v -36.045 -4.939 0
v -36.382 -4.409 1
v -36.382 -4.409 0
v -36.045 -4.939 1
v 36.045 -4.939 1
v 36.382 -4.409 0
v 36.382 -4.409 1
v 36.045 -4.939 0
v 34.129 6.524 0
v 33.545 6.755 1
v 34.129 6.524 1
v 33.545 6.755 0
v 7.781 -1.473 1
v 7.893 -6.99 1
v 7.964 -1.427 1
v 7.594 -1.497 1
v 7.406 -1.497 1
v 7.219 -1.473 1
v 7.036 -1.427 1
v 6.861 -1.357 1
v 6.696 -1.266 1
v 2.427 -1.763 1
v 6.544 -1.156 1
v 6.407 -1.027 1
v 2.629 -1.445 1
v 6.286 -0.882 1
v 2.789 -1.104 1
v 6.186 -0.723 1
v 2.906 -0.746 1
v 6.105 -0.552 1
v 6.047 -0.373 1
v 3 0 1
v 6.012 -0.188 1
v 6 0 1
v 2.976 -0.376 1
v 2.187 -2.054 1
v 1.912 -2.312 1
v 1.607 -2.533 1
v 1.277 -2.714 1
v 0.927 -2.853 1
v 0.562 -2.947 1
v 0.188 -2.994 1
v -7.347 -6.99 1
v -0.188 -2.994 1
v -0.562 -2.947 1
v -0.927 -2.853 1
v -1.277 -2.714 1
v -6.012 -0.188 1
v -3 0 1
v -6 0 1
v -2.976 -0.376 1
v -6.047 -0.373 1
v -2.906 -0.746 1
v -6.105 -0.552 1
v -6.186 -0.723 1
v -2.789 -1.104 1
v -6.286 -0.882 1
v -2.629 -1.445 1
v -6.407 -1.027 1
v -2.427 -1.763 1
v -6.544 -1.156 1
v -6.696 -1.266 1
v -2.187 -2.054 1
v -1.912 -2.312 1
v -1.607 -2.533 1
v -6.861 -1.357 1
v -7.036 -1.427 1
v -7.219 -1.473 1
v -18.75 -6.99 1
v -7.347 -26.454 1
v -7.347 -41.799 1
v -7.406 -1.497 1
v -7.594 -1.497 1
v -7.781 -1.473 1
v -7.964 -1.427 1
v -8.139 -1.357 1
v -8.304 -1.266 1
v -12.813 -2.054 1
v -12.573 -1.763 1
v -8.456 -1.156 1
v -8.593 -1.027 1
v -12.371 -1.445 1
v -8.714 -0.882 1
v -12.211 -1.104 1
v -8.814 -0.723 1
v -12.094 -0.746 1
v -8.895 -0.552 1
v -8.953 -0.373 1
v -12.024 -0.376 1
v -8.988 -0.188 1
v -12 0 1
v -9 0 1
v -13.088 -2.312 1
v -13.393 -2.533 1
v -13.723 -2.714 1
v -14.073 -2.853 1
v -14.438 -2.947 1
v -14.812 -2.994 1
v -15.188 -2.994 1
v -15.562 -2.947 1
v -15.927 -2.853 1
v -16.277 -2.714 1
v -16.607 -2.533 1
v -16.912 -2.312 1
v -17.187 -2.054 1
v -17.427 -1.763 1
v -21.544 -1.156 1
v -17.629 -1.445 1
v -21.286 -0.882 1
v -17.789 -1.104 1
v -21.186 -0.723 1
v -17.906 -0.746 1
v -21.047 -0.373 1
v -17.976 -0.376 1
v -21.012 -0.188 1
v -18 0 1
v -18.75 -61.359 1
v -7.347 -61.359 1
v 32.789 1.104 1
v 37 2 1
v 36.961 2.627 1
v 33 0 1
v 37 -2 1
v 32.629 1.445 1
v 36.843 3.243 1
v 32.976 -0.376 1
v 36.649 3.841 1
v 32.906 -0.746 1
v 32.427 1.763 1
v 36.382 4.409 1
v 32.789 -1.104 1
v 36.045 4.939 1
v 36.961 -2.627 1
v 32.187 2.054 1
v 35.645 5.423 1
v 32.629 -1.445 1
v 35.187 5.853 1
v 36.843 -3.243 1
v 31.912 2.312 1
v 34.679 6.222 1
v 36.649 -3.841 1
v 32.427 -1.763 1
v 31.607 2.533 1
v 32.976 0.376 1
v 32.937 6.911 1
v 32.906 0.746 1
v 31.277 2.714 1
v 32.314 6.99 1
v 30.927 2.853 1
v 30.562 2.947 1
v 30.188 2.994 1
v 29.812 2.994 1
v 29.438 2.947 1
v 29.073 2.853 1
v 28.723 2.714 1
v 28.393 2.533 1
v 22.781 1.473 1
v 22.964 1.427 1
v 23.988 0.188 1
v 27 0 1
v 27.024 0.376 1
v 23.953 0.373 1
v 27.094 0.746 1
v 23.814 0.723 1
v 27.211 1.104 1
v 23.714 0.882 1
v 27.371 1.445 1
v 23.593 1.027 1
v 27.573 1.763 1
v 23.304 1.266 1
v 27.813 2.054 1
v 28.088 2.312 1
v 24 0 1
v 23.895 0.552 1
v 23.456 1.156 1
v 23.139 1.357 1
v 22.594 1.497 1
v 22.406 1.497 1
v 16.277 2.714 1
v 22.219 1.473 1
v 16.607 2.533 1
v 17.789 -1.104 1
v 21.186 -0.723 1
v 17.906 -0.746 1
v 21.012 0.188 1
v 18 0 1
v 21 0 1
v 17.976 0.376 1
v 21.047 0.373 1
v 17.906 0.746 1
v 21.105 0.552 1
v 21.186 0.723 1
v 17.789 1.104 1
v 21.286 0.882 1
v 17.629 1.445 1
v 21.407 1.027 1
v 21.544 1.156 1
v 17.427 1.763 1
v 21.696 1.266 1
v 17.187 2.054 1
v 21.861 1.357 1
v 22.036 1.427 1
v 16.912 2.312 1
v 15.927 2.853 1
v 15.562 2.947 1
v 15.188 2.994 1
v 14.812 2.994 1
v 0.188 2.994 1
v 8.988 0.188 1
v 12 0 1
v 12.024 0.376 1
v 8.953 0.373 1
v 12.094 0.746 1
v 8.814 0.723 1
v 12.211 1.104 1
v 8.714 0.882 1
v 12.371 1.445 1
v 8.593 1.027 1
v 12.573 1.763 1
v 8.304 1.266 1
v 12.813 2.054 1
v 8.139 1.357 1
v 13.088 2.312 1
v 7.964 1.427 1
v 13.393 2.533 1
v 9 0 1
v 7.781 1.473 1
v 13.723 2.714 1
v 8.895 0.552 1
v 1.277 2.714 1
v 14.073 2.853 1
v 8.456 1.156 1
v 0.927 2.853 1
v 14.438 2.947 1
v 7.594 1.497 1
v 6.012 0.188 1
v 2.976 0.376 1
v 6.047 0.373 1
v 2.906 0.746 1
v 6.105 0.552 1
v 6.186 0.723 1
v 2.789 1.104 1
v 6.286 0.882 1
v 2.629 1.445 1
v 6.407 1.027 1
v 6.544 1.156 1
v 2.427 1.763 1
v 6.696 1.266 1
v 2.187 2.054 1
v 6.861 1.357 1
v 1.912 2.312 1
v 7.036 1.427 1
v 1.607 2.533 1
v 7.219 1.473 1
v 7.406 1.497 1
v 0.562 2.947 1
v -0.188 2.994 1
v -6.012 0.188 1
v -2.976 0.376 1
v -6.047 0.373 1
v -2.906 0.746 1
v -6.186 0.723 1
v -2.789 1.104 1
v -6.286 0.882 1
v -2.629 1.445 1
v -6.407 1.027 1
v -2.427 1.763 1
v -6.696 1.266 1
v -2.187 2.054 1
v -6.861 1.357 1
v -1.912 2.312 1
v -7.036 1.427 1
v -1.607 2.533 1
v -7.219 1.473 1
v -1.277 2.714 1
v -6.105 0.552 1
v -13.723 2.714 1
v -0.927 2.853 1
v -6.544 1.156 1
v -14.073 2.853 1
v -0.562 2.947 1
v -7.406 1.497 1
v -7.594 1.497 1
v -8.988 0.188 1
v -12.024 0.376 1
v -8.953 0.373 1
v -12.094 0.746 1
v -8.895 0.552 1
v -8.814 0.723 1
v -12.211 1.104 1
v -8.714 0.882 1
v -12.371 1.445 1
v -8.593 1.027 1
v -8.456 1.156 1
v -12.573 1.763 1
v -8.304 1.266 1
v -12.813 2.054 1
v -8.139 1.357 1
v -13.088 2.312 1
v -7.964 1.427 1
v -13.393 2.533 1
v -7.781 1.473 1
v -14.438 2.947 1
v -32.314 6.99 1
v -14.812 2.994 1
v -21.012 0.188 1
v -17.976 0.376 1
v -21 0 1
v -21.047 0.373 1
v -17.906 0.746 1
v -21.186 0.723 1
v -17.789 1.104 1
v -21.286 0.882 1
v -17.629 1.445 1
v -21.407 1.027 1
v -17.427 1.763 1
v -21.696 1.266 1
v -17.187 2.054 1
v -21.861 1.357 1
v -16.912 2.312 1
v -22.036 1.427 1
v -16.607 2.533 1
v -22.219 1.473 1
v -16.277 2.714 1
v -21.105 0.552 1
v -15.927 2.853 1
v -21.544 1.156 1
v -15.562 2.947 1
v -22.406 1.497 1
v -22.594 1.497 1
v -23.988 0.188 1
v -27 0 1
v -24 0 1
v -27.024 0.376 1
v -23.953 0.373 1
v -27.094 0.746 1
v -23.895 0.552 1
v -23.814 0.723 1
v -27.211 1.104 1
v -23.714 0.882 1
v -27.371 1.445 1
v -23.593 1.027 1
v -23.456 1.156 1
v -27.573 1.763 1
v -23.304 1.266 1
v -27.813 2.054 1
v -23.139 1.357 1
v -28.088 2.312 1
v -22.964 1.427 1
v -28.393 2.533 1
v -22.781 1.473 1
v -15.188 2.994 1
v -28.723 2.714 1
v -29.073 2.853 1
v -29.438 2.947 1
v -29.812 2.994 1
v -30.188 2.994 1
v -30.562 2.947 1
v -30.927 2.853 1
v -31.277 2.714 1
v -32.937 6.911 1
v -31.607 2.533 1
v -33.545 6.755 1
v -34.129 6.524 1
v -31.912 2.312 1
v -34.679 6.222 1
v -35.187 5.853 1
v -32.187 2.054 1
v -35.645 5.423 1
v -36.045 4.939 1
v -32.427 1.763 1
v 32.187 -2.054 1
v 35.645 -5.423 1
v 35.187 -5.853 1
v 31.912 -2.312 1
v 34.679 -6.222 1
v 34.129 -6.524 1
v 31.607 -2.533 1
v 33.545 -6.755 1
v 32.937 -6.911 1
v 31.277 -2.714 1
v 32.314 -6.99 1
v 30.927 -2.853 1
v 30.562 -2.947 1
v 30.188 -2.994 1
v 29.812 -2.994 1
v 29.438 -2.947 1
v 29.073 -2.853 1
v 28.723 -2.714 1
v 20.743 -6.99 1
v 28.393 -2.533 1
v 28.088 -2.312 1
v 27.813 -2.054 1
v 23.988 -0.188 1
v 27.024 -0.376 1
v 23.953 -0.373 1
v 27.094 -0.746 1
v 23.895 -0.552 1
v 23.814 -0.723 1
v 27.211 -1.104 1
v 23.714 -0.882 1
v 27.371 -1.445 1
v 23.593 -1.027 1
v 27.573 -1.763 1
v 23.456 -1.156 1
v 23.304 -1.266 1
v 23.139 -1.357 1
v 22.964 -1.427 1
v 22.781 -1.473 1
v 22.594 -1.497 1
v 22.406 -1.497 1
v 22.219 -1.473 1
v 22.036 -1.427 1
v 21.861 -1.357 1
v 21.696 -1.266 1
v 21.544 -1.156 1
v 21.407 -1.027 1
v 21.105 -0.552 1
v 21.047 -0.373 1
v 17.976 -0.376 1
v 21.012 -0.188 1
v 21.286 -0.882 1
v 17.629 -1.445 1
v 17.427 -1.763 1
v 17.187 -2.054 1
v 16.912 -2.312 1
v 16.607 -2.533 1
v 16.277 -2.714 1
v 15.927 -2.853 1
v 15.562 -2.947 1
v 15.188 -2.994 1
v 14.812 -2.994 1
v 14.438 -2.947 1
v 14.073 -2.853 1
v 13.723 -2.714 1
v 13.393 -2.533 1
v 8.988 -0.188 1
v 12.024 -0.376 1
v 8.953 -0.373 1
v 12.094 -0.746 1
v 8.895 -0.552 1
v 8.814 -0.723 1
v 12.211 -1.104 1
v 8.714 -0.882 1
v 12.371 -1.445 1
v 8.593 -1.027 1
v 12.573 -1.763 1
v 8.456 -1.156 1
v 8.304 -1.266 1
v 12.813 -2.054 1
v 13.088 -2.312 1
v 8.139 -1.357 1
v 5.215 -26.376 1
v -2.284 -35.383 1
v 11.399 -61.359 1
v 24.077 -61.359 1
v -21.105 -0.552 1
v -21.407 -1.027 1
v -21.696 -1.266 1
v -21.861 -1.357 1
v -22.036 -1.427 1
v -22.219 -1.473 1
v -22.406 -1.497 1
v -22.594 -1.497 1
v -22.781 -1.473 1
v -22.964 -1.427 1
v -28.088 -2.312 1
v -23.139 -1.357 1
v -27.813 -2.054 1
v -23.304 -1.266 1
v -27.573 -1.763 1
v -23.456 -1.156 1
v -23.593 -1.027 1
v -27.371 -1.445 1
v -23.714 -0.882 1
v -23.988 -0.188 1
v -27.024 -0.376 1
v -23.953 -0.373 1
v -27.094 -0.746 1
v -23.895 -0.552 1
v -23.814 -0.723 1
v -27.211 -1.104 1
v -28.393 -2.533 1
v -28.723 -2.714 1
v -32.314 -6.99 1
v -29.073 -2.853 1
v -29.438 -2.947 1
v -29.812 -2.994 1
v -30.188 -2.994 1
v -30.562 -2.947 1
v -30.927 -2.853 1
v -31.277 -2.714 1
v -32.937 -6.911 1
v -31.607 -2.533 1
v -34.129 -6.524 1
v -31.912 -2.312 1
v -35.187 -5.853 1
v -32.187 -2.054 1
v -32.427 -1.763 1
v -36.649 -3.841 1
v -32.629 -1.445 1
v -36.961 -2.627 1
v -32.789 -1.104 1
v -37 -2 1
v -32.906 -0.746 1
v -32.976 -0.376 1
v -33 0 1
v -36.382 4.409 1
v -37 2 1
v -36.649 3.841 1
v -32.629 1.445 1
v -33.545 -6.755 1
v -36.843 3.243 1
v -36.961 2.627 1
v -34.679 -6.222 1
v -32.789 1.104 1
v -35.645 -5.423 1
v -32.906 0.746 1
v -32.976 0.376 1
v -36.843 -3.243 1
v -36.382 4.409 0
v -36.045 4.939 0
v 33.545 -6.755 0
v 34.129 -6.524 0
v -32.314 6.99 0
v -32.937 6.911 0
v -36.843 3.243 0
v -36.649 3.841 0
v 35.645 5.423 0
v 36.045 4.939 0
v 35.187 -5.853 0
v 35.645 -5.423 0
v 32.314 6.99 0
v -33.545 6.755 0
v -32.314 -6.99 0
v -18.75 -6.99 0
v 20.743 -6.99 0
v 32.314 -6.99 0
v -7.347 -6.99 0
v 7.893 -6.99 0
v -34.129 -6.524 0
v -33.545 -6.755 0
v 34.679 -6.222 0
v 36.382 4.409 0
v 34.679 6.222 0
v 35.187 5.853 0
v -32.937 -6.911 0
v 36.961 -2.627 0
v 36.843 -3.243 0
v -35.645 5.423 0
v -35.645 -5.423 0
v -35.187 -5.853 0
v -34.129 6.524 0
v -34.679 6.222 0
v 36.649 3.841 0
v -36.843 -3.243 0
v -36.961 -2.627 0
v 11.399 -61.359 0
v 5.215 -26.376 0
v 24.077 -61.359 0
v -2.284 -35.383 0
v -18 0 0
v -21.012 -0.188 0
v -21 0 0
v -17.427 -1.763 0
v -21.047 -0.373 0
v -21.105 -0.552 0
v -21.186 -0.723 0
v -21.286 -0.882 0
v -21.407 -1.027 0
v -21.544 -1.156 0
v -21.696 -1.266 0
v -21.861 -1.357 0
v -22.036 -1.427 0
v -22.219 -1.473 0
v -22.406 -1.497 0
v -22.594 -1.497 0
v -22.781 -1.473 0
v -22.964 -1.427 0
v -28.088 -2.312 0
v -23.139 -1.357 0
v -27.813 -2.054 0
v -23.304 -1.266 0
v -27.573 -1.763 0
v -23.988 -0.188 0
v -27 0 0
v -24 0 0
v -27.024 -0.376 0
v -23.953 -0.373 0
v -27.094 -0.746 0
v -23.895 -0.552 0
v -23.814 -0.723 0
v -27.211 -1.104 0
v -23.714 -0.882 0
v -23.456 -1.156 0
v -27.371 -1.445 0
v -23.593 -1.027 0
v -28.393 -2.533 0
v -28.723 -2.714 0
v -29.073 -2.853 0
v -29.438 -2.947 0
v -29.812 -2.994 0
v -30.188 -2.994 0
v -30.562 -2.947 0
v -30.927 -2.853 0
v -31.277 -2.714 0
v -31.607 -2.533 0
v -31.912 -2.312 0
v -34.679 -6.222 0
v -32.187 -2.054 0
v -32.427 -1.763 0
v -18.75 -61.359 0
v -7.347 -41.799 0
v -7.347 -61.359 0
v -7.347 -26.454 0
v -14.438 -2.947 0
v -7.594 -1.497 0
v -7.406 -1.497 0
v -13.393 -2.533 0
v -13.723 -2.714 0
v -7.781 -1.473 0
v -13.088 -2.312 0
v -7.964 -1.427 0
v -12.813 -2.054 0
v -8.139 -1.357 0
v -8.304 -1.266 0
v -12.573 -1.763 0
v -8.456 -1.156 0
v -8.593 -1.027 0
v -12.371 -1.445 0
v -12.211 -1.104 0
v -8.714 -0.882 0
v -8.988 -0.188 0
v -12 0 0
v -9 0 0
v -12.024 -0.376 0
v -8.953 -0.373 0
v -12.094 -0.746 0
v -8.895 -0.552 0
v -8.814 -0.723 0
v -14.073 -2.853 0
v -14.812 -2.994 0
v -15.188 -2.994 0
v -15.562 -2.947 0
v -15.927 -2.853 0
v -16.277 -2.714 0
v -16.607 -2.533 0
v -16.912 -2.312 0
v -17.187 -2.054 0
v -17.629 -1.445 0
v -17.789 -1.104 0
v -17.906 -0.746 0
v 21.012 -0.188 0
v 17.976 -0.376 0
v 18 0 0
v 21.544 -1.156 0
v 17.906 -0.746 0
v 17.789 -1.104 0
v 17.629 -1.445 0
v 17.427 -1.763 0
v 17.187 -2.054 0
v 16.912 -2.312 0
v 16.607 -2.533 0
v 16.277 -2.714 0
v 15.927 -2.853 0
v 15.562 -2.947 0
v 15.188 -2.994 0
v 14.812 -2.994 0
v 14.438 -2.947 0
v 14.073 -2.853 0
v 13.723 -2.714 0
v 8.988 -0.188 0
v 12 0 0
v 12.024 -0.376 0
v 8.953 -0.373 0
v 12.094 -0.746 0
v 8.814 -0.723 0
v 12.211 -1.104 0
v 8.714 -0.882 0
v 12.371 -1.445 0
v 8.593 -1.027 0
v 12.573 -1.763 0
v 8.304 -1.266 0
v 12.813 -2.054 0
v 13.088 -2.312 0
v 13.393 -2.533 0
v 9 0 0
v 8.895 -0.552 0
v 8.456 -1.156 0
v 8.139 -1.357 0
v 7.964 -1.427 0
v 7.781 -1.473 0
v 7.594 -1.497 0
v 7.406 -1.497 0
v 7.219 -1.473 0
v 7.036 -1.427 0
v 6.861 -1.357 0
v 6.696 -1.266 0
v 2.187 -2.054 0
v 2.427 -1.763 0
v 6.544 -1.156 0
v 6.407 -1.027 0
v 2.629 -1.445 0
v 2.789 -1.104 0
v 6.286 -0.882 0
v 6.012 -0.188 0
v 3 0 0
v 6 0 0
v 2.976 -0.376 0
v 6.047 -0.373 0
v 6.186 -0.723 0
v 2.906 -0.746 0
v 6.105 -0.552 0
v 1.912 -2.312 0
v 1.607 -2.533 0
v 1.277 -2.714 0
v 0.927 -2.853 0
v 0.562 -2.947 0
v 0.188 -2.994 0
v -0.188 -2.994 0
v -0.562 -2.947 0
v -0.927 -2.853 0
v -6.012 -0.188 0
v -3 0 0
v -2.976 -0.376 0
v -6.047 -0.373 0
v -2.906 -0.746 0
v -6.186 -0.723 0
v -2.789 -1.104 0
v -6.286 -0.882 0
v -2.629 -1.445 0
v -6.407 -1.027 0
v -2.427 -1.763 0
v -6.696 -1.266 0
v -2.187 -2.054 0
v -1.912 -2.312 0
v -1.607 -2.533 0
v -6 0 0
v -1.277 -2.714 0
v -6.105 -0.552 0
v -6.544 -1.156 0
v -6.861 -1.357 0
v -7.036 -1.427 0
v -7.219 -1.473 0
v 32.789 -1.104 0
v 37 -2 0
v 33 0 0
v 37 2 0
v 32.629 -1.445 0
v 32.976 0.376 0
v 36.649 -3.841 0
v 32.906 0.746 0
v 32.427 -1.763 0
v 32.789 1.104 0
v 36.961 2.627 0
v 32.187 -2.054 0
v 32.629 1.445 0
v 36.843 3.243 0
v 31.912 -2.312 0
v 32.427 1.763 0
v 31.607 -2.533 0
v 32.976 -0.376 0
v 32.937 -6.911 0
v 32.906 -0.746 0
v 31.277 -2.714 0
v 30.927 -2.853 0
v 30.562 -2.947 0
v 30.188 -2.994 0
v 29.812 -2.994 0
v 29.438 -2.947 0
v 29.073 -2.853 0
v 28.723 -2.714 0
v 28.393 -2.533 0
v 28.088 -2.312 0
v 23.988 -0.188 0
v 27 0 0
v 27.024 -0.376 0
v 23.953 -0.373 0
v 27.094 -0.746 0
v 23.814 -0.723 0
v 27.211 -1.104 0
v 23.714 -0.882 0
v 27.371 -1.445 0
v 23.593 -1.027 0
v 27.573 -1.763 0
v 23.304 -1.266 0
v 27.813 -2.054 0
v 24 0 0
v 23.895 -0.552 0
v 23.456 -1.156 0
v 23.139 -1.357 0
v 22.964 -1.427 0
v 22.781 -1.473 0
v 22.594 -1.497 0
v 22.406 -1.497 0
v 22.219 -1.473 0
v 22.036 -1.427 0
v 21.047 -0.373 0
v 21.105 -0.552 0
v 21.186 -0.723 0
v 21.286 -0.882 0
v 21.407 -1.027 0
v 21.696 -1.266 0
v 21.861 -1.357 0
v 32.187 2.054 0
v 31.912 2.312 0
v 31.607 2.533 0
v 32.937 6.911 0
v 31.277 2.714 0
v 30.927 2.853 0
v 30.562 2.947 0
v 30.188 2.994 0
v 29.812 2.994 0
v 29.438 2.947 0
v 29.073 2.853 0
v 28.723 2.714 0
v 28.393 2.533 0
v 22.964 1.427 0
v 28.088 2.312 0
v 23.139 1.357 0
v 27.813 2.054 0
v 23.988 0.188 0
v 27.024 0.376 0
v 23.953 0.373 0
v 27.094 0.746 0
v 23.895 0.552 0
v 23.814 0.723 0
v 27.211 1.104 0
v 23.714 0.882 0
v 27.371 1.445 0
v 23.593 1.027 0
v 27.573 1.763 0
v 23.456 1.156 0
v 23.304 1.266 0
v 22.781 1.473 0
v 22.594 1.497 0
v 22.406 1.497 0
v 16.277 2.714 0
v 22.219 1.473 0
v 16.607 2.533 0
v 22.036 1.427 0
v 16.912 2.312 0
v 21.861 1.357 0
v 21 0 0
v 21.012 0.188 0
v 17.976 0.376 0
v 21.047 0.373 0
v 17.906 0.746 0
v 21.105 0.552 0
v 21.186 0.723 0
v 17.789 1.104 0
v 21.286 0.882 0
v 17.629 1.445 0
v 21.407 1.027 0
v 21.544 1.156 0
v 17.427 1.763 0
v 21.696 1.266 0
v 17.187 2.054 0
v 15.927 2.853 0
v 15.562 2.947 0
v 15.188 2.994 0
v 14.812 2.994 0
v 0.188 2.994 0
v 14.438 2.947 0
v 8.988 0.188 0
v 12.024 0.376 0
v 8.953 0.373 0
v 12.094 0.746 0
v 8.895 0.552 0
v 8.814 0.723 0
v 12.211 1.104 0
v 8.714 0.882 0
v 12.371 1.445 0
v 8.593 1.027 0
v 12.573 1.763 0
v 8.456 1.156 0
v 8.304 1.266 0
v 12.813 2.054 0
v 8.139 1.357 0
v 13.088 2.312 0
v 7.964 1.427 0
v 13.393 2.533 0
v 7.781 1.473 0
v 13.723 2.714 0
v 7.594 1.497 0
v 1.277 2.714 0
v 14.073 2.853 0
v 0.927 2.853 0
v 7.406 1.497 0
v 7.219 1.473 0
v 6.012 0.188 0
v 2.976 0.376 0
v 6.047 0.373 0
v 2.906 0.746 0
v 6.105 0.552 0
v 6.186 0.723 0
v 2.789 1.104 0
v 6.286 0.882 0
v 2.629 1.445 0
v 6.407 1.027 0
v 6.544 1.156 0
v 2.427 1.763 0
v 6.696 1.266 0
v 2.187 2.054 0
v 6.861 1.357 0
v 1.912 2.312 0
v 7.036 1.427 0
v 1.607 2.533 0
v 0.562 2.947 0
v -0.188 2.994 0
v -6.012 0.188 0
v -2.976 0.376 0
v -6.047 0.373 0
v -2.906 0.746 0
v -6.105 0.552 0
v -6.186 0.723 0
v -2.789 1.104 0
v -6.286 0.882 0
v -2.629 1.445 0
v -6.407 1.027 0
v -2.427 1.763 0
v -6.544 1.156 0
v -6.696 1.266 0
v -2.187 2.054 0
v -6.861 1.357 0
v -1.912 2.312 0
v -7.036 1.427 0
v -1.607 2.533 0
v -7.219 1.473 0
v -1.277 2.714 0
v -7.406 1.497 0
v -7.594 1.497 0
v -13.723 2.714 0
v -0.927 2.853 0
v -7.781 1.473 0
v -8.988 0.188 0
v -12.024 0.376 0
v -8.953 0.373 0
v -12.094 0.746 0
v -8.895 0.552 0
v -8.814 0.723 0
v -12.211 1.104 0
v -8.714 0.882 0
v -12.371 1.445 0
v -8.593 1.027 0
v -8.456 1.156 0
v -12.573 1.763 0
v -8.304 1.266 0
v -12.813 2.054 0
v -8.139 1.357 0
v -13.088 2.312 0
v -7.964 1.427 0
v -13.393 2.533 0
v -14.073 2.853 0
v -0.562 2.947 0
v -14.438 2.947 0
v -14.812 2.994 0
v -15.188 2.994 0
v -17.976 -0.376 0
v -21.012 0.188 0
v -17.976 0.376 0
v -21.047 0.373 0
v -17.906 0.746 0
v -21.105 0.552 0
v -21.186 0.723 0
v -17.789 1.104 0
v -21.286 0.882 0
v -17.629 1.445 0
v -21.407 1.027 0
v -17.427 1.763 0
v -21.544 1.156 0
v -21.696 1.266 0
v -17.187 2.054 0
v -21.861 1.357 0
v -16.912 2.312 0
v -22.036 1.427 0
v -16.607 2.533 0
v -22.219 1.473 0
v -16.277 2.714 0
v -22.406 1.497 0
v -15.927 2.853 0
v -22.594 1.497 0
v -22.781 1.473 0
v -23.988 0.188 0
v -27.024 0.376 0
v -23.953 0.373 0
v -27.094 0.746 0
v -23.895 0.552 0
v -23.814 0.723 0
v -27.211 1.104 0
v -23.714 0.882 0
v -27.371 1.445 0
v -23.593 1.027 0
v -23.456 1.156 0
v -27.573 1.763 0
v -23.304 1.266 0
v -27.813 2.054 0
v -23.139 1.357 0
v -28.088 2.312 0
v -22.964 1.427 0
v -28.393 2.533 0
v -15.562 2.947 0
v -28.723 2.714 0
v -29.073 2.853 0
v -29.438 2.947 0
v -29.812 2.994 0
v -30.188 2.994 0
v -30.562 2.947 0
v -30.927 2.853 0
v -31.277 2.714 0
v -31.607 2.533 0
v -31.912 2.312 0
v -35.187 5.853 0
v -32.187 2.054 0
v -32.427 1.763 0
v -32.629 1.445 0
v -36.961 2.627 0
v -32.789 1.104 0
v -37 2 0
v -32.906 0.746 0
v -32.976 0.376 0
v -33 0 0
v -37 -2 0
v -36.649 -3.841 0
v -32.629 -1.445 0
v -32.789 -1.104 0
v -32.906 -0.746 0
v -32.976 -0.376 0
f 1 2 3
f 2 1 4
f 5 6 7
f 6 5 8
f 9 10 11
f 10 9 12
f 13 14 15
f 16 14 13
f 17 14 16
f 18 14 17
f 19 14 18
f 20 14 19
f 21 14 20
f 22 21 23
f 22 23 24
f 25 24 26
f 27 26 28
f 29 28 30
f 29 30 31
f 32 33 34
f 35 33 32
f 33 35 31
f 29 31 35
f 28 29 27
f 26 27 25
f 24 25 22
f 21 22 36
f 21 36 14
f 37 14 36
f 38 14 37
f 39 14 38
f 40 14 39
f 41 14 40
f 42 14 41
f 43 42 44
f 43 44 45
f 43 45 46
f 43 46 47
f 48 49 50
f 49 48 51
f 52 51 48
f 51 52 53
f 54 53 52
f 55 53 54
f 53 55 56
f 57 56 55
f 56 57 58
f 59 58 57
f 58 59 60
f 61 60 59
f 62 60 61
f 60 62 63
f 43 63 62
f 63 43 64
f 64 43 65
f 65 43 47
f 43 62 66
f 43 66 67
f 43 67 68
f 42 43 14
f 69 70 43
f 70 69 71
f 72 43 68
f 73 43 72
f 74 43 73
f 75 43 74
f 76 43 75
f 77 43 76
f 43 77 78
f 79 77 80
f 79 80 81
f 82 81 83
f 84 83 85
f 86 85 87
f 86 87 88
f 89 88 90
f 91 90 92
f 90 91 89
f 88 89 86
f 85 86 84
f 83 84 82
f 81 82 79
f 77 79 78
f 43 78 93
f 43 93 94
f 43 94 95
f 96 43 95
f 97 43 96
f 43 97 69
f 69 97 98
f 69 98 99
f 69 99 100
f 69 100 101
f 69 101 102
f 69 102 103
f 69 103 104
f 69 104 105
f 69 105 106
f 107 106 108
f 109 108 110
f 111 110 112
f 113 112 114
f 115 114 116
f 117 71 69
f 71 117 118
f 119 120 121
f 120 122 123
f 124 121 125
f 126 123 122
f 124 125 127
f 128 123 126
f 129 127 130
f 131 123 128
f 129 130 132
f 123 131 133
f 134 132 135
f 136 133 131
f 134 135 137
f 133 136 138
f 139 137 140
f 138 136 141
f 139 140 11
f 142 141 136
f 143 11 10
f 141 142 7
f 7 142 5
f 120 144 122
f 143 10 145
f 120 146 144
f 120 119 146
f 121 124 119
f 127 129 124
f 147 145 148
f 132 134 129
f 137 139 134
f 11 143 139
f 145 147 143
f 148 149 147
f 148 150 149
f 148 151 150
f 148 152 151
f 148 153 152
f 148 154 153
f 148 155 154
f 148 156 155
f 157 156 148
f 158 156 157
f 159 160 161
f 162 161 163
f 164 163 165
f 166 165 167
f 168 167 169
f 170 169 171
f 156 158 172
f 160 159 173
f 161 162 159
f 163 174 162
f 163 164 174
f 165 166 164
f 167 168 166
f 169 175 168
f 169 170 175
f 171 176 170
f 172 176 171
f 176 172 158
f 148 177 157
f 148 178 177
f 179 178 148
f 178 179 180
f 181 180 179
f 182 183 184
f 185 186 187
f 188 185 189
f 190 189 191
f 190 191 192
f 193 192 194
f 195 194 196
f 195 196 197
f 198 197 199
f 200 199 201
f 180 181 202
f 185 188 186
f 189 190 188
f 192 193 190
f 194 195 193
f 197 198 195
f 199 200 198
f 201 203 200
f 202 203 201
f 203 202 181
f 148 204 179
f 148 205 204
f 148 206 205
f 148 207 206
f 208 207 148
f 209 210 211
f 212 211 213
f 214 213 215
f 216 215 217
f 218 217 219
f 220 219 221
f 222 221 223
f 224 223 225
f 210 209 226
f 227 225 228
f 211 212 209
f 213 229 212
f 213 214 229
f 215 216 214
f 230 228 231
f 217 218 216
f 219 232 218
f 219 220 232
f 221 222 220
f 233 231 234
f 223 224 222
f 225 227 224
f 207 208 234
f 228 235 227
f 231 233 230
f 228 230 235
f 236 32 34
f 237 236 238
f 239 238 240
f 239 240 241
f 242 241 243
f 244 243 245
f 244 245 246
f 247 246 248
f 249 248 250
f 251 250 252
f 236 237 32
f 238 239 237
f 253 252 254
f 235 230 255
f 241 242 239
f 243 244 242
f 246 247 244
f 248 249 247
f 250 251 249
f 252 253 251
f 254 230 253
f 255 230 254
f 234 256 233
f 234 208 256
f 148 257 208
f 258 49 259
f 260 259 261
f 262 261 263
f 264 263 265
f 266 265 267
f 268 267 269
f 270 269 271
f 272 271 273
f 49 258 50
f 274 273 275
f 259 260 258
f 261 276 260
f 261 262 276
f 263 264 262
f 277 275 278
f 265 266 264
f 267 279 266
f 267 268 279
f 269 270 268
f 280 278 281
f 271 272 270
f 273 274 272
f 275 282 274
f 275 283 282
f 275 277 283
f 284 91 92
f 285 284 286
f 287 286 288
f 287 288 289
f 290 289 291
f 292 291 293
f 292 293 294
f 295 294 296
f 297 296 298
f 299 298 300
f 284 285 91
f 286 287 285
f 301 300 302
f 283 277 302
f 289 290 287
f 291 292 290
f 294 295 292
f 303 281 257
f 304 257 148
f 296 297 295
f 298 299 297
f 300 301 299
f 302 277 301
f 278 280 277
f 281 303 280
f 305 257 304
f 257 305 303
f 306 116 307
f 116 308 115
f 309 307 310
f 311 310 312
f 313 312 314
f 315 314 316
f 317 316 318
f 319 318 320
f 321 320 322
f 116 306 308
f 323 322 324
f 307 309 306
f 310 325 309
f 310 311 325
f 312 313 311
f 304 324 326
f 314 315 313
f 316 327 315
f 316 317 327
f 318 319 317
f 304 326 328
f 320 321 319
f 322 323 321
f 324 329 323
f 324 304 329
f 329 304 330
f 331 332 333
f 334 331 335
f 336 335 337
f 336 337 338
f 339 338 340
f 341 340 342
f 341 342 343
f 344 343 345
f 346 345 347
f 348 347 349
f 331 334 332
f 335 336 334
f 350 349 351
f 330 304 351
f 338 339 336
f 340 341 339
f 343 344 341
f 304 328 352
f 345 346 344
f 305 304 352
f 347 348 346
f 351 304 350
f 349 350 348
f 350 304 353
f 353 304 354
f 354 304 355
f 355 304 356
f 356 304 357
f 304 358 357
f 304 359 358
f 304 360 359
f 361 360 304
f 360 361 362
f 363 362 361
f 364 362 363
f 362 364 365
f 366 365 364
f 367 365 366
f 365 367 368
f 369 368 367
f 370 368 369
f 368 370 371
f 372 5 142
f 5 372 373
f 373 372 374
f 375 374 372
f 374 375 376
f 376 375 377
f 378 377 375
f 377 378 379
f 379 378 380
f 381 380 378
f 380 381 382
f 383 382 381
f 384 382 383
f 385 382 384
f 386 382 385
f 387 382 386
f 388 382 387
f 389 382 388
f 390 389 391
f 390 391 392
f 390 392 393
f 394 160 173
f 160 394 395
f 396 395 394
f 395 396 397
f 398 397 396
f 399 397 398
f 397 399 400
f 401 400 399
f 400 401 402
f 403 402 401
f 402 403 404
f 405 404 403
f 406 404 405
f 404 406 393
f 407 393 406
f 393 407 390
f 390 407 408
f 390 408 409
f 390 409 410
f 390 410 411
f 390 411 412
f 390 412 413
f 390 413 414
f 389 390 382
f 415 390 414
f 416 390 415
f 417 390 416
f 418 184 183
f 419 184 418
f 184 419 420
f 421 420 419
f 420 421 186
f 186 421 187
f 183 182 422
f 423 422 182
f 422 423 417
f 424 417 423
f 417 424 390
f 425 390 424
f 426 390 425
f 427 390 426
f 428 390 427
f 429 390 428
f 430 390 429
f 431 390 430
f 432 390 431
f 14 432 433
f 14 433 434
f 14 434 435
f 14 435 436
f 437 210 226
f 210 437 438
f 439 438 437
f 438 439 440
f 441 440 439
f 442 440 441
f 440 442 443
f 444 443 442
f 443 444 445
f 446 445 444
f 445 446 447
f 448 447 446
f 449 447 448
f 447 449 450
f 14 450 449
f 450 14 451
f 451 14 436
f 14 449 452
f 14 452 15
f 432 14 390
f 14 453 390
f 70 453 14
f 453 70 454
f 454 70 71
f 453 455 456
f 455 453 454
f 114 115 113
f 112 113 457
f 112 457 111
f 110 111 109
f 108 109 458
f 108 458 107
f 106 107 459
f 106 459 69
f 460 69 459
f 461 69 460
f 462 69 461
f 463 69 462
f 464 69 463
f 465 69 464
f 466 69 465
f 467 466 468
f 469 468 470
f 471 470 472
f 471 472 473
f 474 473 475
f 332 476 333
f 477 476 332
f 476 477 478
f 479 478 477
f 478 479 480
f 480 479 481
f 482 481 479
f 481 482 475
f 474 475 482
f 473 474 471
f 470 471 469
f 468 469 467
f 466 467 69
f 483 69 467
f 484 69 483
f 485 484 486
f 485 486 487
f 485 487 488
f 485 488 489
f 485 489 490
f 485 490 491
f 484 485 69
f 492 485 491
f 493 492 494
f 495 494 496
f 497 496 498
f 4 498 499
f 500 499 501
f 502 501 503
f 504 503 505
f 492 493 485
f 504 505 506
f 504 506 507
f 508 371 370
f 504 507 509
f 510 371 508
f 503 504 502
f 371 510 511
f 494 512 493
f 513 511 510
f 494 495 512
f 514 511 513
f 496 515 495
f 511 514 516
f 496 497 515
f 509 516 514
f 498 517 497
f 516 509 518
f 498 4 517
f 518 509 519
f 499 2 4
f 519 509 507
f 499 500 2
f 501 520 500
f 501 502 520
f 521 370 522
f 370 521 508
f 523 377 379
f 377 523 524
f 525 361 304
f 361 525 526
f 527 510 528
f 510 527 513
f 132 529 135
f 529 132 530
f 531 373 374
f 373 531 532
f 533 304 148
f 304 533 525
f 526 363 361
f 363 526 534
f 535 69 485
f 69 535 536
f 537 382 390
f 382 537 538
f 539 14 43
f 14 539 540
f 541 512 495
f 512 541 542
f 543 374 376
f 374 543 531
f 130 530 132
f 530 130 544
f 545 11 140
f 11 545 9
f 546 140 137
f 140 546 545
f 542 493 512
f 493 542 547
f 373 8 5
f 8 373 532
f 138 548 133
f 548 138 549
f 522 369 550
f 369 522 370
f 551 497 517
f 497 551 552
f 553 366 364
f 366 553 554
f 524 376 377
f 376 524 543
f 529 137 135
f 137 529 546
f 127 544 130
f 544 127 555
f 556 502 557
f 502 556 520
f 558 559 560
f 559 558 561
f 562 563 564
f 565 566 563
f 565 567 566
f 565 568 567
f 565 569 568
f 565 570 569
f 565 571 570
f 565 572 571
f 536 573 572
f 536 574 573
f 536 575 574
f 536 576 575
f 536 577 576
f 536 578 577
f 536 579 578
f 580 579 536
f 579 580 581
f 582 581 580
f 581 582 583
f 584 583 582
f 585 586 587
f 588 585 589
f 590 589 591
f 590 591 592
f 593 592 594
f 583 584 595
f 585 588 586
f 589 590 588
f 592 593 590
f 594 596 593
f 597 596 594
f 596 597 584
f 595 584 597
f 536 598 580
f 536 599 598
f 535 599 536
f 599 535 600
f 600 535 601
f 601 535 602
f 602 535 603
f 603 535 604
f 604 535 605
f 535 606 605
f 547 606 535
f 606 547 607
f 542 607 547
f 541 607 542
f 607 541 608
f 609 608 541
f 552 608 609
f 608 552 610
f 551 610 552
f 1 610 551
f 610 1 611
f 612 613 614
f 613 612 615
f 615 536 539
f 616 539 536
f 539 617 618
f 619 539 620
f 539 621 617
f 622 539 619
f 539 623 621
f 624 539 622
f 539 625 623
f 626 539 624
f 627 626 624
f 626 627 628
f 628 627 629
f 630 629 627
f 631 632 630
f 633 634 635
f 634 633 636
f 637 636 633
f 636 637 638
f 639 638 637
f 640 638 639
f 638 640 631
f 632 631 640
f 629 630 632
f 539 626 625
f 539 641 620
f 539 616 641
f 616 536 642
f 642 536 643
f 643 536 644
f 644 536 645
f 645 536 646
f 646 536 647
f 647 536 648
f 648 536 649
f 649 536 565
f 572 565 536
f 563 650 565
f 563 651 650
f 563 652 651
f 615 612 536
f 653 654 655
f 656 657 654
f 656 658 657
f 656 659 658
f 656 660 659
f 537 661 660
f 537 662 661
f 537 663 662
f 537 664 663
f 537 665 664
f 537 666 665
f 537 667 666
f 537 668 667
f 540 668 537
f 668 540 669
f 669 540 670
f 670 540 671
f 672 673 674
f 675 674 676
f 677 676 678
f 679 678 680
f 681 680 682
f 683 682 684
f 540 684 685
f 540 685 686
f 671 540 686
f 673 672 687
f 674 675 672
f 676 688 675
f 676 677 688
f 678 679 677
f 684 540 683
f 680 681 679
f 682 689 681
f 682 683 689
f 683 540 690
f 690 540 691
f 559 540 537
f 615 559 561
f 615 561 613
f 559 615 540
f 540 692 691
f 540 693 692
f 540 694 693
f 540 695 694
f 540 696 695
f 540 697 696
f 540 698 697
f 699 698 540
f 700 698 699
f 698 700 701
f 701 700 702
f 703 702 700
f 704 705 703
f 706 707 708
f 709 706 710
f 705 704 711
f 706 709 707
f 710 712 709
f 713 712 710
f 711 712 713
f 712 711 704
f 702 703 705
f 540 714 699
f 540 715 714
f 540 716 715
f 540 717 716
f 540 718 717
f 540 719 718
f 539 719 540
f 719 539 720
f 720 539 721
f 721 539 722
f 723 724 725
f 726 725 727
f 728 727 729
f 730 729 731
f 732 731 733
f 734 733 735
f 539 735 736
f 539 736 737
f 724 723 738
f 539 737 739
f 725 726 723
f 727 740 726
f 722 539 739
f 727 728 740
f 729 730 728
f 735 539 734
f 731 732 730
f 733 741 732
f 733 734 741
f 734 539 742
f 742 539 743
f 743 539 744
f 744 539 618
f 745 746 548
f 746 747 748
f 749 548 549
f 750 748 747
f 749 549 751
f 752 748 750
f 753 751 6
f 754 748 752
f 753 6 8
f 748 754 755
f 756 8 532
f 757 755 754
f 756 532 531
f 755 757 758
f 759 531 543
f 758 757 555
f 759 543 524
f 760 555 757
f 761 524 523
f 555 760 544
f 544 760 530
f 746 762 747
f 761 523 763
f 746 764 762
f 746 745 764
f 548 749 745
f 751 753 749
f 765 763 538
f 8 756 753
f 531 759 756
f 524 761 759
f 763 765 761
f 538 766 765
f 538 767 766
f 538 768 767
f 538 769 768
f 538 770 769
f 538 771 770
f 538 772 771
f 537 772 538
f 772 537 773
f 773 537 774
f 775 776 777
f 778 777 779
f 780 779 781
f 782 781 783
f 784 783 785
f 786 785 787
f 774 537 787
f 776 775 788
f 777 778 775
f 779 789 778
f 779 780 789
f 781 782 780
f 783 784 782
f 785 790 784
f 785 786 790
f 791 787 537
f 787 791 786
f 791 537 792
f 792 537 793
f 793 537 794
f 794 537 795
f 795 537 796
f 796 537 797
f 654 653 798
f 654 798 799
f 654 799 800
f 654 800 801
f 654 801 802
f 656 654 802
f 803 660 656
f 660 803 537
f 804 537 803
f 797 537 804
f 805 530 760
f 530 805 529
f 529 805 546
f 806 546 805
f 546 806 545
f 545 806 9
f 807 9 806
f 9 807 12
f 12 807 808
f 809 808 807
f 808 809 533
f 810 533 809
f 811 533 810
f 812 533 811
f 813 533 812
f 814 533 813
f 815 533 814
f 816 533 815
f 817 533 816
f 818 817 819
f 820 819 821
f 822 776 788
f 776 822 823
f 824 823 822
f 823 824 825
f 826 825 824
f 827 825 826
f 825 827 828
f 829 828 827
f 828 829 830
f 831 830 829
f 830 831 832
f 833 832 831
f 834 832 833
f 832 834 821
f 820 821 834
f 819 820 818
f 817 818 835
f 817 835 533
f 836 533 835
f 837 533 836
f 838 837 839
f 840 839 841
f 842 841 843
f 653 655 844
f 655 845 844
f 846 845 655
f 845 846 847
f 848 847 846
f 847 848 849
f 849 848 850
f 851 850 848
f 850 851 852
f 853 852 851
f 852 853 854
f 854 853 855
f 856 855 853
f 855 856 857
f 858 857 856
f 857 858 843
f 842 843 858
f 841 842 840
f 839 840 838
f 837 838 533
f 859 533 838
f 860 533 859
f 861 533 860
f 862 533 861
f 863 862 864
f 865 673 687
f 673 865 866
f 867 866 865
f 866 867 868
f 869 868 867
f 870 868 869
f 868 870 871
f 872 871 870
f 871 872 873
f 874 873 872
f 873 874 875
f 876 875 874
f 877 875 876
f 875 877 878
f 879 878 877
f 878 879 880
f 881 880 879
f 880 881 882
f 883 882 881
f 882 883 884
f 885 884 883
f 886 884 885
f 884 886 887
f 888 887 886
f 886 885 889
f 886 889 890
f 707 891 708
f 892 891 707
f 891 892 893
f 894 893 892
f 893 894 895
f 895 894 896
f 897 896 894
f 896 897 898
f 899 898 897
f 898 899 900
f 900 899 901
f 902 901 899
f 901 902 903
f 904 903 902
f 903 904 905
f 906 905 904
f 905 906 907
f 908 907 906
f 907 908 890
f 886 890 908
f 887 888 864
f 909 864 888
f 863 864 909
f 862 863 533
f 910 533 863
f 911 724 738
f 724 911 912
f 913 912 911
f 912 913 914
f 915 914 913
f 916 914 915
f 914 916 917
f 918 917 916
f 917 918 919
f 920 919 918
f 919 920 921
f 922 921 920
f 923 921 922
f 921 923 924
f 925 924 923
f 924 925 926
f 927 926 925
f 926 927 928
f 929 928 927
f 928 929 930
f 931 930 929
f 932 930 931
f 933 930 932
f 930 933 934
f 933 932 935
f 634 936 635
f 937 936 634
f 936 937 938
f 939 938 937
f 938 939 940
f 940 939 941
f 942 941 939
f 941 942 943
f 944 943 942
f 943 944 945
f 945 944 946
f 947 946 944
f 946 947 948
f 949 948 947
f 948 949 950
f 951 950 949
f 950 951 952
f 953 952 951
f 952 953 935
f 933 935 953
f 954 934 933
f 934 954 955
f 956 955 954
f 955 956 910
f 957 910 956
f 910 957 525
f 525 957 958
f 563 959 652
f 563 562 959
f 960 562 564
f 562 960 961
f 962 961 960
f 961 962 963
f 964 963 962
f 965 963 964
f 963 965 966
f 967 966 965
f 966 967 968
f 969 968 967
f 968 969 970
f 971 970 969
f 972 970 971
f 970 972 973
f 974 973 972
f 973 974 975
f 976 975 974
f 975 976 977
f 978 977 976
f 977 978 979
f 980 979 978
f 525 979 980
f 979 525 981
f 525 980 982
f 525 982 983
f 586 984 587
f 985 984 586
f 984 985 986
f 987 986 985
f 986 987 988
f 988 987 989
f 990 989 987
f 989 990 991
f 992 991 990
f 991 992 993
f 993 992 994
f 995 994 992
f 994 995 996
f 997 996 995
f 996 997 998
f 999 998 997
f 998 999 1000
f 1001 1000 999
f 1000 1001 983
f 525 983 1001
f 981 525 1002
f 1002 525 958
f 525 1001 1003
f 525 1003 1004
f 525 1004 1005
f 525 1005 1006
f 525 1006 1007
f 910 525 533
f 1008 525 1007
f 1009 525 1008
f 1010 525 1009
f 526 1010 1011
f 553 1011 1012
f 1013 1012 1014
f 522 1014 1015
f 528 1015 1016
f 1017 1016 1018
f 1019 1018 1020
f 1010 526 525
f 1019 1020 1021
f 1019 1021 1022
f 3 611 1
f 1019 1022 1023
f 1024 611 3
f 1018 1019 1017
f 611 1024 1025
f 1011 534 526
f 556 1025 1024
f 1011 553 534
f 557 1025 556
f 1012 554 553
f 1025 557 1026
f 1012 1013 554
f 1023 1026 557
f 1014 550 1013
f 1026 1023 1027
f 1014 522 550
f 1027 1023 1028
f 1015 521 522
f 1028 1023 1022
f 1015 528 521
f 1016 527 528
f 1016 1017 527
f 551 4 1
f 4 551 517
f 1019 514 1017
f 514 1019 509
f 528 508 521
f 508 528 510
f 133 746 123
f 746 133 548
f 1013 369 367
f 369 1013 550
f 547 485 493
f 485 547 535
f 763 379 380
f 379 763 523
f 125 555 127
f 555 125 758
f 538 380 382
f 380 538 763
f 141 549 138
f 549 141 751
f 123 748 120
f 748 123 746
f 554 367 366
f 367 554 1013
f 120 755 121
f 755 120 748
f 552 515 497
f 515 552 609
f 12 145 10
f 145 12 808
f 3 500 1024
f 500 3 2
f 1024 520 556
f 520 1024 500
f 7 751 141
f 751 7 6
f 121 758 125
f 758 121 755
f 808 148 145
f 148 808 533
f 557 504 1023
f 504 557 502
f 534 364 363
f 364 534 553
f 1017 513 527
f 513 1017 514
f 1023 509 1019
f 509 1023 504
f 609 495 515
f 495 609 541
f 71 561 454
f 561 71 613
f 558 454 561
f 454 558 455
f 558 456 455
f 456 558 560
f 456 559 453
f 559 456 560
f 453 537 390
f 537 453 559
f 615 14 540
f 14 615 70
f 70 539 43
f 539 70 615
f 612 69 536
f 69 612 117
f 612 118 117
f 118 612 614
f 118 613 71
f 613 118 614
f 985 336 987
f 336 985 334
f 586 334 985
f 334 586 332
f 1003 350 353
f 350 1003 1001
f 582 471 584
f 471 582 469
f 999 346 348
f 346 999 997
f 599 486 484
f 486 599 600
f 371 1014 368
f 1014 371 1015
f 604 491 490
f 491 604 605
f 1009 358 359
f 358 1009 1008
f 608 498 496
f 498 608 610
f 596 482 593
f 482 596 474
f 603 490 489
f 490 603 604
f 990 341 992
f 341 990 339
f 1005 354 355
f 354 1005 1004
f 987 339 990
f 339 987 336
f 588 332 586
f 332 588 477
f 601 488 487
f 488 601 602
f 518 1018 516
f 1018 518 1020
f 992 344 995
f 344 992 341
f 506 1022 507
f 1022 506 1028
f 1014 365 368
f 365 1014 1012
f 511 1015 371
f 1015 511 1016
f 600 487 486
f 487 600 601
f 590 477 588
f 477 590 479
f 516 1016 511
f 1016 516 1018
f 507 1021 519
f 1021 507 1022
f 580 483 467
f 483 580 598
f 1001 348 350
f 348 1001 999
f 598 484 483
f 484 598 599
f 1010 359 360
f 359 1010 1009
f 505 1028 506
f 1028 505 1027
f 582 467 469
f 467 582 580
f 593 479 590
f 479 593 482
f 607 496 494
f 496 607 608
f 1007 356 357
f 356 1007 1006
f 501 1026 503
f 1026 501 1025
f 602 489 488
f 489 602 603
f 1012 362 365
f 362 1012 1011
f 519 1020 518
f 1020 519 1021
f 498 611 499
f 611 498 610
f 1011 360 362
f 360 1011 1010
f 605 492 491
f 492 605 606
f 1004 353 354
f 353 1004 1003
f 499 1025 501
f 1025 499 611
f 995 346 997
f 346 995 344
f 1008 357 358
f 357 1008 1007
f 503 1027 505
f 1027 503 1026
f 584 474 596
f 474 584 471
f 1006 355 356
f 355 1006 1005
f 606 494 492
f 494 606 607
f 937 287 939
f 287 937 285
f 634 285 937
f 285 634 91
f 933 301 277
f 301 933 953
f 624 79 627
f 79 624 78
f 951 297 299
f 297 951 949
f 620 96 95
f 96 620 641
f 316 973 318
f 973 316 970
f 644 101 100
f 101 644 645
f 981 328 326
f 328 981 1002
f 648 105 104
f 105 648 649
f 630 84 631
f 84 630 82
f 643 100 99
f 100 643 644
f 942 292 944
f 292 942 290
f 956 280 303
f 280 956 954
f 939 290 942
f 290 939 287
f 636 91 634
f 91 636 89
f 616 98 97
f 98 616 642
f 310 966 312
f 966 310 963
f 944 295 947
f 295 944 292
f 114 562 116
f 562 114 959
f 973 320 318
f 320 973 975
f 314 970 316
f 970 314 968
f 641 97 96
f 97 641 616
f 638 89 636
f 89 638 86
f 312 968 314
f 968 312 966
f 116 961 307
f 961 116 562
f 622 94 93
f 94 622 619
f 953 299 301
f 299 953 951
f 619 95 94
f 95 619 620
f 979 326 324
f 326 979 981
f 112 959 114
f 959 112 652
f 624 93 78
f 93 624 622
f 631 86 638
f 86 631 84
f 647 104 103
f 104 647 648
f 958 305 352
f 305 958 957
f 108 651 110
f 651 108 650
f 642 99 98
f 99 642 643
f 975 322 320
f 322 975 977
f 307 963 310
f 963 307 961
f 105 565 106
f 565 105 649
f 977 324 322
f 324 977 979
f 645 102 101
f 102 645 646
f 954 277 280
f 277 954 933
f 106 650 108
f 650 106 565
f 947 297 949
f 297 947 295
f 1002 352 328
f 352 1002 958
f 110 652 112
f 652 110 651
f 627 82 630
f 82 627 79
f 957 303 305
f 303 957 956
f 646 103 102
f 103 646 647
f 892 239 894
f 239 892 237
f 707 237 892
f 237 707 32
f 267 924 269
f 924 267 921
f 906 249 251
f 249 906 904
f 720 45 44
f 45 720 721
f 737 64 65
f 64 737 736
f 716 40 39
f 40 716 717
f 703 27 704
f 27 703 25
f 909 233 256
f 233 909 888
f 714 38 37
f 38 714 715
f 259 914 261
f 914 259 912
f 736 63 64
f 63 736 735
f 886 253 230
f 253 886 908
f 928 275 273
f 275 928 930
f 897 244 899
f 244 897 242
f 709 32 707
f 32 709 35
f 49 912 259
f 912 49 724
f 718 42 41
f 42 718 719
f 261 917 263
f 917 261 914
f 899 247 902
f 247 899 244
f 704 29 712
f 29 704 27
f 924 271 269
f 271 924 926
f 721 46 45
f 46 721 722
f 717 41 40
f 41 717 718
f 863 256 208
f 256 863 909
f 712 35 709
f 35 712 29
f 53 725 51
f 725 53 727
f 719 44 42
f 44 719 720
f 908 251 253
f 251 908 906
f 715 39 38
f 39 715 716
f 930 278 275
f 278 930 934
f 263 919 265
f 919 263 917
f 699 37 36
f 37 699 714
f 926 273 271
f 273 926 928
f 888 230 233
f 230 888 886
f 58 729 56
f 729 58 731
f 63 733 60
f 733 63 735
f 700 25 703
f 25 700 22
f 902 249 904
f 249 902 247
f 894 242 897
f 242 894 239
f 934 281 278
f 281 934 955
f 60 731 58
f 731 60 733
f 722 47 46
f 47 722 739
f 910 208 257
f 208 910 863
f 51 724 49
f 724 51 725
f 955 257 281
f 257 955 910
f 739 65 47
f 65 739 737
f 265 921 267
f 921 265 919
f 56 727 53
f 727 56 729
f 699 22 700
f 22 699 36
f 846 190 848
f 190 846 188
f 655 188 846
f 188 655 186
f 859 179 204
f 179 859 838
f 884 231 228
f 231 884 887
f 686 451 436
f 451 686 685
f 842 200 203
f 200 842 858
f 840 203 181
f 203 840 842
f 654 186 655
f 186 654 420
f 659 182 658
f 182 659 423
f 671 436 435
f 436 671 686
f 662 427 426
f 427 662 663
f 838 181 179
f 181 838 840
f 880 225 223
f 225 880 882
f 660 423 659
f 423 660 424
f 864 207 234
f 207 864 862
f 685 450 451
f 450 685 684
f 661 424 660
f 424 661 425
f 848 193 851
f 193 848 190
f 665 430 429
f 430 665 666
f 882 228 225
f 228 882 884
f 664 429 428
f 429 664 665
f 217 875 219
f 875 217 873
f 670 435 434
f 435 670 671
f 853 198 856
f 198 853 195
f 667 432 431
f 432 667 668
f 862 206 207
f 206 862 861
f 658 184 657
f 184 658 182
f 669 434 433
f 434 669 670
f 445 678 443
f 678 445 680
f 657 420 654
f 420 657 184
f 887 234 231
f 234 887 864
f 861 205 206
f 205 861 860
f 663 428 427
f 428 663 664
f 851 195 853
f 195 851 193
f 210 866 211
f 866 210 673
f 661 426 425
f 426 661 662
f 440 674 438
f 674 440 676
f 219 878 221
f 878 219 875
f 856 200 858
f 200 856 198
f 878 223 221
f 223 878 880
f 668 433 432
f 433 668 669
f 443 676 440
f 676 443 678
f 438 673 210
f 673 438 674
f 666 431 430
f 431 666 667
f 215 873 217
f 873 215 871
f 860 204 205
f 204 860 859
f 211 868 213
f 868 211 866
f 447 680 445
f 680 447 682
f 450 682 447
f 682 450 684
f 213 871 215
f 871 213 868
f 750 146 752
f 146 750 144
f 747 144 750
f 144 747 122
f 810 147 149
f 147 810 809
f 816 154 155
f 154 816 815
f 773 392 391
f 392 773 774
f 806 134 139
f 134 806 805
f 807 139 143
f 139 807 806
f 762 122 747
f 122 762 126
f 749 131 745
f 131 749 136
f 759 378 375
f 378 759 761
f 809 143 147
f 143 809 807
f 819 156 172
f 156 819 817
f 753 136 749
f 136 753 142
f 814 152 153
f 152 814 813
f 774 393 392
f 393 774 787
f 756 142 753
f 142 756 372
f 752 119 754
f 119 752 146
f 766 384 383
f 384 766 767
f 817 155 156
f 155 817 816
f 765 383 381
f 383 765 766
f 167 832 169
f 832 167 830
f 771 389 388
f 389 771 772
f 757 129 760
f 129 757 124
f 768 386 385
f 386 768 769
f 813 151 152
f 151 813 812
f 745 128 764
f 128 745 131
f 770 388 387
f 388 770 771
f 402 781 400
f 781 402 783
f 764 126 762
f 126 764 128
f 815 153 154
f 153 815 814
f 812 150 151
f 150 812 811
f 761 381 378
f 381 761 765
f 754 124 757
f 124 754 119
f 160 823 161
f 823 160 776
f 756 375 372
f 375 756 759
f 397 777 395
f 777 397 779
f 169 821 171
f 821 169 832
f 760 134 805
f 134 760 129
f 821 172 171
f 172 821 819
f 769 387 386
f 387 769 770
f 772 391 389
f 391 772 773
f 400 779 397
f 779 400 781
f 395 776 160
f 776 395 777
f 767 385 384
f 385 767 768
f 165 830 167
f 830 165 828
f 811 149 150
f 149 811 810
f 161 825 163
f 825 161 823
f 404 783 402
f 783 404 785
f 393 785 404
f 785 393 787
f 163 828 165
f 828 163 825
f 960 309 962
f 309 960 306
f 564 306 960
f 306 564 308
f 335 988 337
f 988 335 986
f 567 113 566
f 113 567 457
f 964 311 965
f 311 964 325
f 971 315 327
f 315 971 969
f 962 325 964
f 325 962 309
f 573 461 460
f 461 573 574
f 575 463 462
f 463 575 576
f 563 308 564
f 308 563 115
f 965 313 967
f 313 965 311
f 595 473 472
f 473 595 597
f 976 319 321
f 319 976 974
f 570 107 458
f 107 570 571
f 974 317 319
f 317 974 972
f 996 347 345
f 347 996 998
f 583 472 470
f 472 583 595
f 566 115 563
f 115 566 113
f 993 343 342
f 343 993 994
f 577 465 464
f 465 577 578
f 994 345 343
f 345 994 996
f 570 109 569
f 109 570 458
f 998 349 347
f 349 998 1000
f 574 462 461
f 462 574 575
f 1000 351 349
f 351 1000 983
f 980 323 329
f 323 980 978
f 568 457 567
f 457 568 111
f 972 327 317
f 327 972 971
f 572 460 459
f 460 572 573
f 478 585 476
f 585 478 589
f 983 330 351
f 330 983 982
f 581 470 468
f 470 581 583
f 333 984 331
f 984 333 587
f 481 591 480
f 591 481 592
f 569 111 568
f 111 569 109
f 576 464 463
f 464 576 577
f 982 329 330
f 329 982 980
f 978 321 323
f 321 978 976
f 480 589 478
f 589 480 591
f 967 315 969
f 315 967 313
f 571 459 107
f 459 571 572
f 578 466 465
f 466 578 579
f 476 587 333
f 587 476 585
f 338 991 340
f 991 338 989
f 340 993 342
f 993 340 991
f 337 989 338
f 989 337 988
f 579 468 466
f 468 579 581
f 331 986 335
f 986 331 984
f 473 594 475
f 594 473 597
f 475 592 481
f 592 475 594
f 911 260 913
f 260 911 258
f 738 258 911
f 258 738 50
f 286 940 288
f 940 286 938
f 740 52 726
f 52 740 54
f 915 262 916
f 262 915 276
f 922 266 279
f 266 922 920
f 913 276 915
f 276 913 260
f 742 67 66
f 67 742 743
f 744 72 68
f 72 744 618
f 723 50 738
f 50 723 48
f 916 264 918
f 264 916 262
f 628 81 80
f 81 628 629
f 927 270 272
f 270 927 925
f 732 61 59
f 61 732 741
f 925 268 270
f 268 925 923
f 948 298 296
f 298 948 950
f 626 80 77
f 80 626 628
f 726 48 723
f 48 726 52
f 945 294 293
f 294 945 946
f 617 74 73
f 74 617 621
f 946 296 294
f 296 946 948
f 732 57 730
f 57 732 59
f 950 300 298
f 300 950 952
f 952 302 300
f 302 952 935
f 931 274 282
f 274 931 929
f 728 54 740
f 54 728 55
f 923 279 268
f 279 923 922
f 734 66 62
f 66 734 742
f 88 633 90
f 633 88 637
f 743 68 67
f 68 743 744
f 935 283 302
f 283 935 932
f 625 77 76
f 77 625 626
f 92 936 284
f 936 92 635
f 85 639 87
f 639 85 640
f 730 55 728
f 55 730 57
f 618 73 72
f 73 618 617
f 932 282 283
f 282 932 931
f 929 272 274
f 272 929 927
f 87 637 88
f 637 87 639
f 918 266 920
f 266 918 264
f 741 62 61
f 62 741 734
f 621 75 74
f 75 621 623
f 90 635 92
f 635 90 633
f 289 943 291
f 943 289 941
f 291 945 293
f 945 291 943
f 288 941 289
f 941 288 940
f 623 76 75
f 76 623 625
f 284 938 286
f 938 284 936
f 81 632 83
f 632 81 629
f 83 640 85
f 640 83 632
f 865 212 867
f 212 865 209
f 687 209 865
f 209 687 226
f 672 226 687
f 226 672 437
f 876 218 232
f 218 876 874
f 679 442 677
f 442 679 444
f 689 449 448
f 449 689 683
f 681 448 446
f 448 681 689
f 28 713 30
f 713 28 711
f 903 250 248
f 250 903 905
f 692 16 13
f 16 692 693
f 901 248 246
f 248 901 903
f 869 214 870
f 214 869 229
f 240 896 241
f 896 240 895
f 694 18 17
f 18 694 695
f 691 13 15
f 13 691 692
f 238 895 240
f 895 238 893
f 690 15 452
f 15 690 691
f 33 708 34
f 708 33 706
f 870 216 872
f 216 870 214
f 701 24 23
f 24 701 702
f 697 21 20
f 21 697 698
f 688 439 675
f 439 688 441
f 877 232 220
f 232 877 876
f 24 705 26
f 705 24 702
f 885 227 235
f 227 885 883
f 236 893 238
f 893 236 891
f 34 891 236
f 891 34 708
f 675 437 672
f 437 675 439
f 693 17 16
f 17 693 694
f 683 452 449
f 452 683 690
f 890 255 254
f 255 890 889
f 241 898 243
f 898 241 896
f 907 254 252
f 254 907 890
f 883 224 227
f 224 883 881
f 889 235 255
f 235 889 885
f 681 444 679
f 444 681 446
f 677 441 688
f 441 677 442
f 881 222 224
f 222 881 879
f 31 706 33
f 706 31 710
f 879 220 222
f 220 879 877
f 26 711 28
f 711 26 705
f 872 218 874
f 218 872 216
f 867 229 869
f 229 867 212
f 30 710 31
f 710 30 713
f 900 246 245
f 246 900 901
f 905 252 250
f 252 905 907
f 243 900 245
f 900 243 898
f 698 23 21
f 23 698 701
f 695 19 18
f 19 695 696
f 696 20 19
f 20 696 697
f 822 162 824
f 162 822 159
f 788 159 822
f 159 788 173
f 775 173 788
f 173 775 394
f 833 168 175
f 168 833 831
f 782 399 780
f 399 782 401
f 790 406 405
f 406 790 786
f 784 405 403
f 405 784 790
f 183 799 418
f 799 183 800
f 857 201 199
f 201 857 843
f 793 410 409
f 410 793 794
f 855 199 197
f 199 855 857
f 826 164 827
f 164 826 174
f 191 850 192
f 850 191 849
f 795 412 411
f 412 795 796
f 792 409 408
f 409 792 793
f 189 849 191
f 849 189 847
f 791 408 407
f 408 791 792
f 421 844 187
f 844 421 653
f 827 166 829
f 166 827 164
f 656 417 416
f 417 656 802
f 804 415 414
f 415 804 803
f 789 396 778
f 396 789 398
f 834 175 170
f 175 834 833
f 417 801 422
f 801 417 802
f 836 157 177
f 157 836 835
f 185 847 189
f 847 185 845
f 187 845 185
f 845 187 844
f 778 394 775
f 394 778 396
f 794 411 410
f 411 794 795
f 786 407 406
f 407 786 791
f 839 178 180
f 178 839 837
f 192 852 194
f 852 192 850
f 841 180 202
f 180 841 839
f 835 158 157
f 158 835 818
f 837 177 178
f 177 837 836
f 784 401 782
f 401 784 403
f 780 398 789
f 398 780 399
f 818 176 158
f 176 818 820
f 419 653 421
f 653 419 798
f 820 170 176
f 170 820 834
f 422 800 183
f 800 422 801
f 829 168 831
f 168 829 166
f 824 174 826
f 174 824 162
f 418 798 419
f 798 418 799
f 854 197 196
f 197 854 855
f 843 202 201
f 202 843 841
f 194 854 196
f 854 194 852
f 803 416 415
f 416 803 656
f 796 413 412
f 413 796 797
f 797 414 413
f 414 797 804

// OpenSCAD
$fn = 50;


difference() {
	union() {
		hull() {
			translate(v = [-32.0000000000, 2.0000000000, 0]) {
				cylinder(h = 1, r = 5);
			}
			translate(v = [32.0000000000, 2.0000000000, 0]) {
				cylinder(h = 1, r = 5);
			}
			translate(v = [-32.0000000000, -2.0000000000, 0]) {
				cylinder(h = 1, r = 5);
			}
			translate(v = [32.0000000000, -2.0000000000, 0]) {
				cylinder(h = 1, r = 5);
			}
		}
		translate(v = [0, -5, 0]) {
			linear_extrude(height = 1) {
				text(font = "DejaVu Sans Mono:style=Bold", halign = "center", size = 57.0000000000, text = "K", valign = "top");
			}
		}
	}
	union() {
		translate(v = [-30.0000000000, 0.0000000000, 0]) {
			translate(v = [0, 0, -100]) {
				cylinder(h = 200, r = 3.0000000000);
			}
		}
		translate(v = [-15.0000000000, 0.0000000000, 0]) {
			translate(v = [0, 0, -100]) {
				cylinder(h = 200, r = 3.0000000000);
			}
		}
		translate(v = [0, 0, -100]) {
			cylinder(h = 200, r = 3.0000000000);
		}
		translate(v = [15.0000000000, 0.0000000000, 0]) {
			translate(v = [0, 0, -100]) {
				cylinder(h = 200, r = 3.0000000000);
			}
		}
		translate(v = [30.0000000000, 0.0000000000, 0]) {
			translate(v = [0, 0, -100]) {
				cylinder(h = 200, r = 3.0000000000);
			}
		}
		translate(v = [-30.0000000000, 0.0000000000, 0]) {
			translate(v = [0, 0, -100]) {
				cylinder(h = 200, r = 1.5000000000);
			}
		}
		translate(v = [-22.5000000000, 0.0000000000, 0]) {
			translate(v = [0, 0, -100]) {
				cylinder(h = 200, r = 1.5000000000);
			}
		}
		translate(v = [-15.0000000000, 0.0000000000, 0]) {
			translate(v = [0, 0, -100]) {
				cylinder(h = 200, r = 1.5000000000);
			}
		}
		translate(v = [-7.5000000000, 0.0000000000, 0]) {
			translate(v = [0, 0, -100]) {
				cylinder(h = 200, r = 1.5000000000);
			}
		}
		translate(v = [0, 0, -100]) {
			cylinder(h = 200, r = 1.5000000000);
		}
		translate(v = [7.5000000000, 0.0000000000, 0]) {
			translate(v = [0, 0, -100]) {
				cylinder(h = 200, r = 1.5000000000);
			}
		}
		translate(v = [15.0000000000, 0.0000000000, 0]) {
			translate(v = [0, 0, -100]) {
				cylinder(h = 200, r = 1.5000000000);
			}
		}
		translate(v = [22.5000000000, 0.0000000000, 0]) {
			translate(v = [0, 0, -100]) {
				cylinder(h = 200, r = 1.5000000000);
			}
		}
		translate(v = [30.0000000000, 0.0000000000, 0]) {
			translate(v = [0, 0, -100]) {
				cylinder(h = 200, r = 1.5000000000);
			}
		}
	}
}
